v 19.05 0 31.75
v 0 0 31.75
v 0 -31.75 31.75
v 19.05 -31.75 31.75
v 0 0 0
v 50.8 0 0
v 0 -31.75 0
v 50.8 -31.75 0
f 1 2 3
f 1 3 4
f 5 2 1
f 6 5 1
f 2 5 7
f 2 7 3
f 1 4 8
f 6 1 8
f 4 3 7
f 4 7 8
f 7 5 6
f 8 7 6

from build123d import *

# Parameters (mm, degrees)
F0_W     = 50.8
F0_H     = 31.75
F1_DEPTH = 31.75
F3_DEPTH = 31.75
F4_W     = 22.45064
F4_H     = 31.75
F5_DEPTH = 17.018


with BuildPart() as f1:
    # F0 (on Front) → F1 (new body)
    with BuildSketch(Plane.XZ):
        with Locations((25.4, 15.875)):
            Rectangle(F0_W, F0_H)
    extrude(amount=F1_DEPTH)

    # F2 (on face) → F3 (cut)
    with BuildSketch(Plane.XZ.offset(31.75)):
        Polygon((50.8, 31.75), (19.05, 31.75), (50.8, 0), align=None)
    extrude(amount=-F3_DEPTH, mode=Mode.SUBTRACT)

    # F4 (on face) → F5 (cut)
    with BuildSketch(Plane(origin=(25.4, 0, 25.4), x_dir=(0.707107, 0, -0.707107), z_dir=(0.707107, 0, 0.707107))):
        with Locations((24.695704, -15.875)):
            Rectangle(F4_W, F4_H)
    extrude(amount=F5_DEPTH, mode=Mode.SUBTRACT)


solid = f1.part
